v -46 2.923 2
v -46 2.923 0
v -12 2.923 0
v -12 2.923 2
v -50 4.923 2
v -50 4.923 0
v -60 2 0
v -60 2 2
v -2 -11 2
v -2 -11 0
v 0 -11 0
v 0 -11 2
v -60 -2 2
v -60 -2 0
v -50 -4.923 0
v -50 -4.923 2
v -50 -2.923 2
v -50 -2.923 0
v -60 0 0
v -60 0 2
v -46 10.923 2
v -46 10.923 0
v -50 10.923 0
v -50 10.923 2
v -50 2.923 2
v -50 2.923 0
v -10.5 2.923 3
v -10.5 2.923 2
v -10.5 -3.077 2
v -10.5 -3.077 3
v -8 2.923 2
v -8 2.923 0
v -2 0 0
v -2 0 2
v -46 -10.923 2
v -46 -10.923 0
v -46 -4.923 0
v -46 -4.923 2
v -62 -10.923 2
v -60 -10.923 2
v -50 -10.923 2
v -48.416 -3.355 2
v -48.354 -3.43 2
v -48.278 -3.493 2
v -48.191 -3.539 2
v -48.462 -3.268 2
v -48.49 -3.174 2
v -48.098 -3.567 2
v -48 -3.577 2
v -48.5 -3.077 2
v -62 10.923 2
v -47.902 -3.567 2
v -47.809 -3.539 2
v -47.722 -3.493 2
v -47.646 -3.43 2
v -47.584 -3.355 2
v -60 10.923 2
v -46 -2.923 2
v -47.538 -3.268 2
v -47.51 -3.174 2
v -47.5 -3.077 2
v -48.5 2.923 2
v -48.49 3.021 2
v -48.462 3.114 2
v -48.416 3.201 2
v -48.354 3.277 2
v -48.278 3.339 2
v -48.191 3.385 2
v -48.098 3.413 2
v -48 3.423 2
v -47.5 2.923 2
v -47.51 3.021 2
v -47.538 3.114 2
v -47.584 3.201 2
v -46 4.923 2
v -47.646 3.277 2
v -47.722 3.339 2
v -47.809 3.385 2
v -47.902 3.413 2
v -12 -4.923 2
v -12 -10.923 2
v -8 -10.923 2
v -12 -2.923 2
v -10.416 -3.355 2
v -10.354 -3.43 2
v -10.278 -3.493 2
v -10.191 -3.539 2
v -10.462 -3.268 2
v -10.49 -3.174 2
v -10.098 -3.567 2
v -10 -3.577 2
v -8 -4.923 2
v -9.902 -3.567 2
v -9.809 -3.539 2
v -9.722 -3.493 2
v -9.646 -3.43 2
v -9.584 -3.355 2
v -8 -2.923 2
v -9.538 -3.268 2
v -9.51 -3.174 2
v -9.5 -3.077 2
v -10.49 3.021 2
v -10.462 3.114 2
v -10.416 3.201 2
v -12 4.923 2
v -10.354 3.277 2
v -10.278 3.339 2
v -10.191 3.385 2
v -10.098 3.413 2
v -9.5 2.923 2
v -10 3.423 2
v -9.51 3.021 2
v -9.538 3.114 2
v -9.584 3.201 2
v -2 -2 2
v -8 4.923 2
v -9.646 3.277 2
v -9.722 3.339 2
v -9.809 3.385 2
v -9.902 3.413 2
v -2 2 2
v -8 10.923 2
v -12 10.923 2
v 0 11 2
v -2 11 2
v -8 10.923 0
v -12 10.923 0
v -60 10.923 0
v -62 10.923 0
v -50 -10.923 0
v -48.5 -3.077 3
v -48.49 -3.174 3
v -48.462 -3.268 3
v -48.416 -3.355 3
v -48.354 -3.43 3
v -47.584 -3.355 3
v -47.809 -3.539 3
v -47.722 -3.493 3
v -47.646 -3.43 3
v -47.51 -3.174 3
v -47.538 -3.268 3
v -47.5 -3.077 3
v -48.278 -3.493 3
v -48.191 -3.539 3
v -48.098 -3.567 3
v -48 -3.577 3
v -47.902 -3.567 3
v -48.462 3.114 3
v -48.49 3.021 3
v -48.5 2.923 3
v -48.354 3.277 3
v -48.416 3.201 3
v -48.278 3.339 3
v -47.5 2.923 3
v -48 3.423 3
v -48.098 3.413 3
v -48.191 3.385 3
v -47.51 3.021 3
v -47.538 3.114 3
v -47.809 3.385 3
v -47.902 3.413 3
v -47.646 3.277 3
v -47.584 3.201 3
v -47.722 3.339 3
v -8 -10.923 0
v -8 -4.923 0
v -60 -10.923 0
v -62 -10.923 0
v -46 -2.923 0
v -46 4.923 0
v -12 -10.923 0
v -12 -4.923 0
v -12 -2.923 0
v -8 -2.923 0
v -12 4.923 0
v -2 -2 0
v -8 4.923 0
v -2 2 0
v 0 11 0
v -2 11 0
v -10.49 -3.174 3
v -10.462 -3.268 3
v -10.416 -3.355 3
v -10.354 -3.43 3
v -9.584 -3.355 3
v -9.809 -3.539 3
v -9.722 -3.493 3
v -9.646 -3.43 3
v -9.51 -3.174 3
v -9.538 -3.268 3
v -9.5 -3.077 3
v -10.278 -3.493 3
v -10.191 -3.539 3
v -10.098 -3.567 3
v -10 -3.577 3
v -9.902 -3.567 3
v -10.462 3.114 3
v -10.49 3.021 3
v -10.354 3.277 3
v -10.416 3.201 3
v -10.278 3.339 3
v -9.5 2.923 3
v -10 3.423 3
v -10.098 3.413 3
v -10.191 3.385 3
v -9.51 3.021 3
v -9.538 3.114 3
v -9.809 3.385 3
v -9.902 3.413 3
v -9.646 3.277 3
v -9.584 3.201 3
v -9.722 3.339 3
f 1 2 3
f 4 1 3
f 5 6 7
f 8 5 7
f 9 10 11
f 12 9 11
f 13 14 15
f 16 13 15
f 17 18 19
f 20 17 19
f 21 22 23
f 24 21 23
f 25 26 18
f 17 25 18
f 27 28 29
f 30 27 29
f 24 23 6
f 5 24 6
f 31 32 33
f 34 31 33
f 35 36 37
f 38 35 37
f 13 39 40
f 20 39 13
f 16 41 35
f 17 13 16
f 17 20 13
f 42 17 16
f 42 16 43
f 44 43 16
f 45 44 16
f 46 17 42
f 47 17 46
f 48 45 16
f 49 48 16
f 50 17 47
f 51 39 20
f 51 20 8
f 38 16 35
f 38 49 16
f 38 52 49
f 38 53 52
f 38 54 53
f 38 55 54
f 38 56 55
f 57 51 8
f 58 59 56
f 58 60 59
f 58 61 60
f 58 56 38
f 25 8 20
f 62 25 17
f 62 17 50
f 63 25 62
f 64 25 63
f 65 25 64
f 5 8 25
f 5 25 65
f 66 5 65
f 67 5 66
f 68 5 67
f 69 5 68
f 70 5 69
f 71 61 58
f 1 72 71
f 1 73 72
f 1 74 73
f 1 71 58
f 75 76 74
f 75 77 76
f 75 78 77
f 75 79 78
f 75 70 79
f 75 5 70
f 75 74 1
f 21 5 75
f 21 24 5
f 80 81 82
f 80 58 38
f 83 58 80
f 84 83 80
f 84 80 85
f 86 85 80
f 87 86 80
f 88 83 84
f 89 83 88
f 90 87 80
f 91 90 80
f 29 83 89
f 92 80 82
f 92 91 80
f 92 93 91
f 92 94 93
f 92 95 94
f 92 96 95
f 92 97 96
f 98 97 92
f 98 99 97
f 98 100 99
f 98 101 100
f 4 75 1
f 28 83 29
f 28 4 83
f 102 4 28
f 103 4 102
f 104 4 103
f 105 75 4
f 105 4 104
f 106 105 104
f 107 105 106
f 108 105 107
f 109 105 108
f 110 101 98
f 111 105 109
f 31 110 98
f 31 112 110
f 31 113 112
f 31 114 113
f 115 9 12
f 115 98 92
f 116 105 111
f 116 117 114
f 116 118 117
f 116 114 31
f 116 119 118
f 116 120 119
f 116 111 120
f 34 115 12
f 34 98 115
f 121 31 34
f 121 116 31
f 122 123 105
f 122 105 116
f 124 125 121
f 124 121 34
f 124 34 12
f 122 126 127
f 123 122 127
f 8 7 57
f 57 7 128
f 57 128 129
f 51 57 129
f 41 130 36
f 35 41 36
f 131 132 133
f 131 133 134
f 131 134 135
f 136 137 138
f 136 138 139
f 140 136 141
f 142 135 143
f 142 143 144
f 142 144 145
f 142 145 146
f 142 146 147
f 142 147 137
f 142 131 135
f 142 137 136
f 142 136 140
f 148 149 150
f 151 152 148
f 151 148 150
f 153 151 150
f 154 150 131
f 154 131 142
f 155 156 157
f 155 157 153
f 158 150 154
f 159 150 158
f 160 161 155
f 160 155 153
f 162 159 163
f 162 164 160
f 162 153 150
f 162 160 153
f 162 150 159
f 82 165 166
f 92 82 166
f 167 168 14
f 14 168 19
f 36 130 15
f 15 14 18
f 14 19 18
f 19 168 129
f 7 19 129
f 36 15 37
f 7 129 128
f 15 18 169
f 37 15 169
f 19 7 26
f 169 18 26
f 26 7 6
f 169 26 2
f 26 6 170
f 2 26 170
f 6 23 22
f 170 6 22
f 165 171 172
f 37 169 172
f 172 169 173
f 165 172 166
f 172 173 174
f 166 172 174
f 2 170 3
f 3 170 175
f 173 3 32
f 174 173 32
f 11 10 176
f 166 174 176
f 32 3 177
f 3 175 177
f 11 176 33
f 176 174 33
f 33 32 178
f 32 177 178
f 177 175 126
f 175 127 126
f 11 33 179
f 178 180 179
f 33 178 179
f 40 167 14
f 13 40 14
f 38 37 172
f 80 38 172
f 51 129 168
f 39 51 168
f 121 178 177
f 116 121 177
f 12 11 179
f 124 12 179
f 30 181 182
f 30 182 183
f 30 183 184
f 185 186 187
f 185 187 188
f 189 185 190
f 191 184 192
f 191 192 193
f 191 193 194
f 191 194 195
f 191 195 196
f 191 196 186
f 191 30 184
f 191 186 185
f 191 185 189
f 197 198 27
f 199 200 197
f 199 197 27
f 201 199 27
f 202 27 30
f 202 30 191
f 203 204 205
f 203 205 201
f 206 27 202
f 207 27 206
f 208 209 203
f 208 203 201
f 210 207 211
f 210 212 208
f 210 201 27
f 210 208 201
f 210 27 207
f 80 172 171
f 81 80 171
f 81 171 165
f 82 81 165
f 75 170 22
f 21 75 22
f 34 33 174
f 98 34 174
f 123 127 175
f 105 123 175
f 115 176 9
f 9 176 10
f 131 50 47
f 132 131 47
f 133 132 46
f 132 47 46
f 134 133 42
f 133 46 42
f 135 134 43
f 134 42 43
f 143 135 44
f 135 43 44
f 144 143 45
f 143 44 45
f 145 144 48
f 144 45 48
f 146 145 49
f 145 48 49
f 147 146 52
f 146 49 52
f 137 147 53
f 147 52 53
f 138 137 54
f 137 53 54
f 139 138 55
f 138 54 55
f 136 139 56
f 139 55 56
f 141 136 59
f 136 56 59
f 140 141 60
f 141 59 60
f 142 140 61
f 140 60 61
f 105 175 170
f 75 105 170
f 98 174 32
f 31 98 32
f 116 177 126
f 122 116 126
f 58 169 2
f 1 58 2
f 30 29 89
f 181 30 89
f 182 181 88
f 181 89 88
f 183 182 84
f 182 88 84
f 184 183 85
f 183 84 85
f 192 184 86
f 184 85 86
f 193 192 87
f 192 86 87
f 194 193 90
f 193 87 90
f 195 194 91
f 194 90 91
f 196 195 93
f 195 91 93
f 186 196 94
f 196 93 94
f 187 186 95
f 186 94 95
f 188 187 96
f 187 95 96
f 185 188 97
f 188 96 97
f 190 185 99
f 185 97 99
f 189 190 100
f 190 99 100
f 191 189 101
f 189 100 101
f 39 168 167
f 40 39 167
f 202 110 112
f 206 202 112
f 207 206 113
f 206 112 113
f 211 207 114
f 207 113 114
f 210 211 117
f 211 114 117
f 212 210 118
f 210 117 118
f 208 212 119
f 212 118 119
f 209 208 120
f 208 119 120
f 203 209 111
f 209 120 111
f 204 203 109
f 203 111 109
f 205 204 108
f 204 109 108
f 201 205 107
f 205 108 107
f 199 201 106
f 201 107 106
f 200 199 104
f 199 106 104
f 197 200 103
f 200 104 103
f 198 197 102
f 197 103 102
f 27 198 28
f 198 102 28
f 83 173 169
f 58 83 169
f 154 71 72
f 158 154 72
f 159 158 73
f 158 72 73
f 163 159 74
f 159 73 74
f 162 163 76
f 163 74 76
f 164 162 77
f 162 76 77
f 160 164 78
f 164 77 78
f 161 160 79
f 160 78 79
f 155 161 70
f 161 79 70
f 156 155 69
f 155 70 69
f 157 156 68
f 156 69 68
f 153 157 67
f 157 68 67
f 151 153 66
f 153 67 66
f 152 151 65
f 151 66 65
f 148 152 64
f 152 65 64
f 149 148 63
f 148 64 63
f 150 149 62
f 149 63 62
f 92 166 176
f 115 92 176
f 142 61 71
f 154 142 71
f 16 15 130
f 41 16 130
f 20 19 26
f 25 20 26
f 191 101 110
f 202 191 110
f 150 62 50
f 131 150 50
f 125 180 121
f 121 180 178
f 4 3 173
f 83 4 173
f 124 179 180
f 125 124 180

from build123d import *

# Parameters (mm, degrees)
F1_DEPTH = 2
F3_DEPTH = 1


with BuildPart() as f1:
    # F0 (on Top) → F1 (new body)
    with BuildSketch(Plane.XY):
        Polygon((0, -11), (0, 0), (0, 11), (-2, 11), (-2, 2), (-8, 4.923089), (-8, 10.923089), (-12, 10.923089), (-12, 4.923089), (-29, 4.923089), (-46, 4.923089), (-46, 10.923089), (-50, 10.923089), (-50, 4.923089), (-60, 2), (-60, 10.923089), (-62, 10.923089), (-62, -10.923089), (-60, -10.923089), (-60, -2), (-50, -4.923089), (-50, -10.923089), (-46, -10.923089), (-46, -4.923089), (-29, -4.923089), (-12, -4.923089), (-12, -10.923089), (-8, -10.923089), (-8, -4.923089), (-2, -2), (-2, -11), align=None)
        Polygon((-60, 0), (-50, 2.923089), (-50, -2.923089), align=None, mode=Mode.SUBTRACT)
        Polygon((-12, 2.923089), (-12, 0), (-12, -2.923089), (-29, -2.923089), (-46, -2.923089), (-46, 0), (-46, 2.923089), (-29, 2.923089), align=None, mode=Mode.SUBTRACT)
        Polygon((-8, 2.923089), (-2, 0), (-8, -2.923089), (-8, 0), align=None, mode=Mode.SUBTRACT)
    extrude(amount=F1_DEPTH)

    # F2 (on face) → F3 (join)
    with BuildSketch(Plane.XY.offset(2)):
        with BuildLine():
            Line((-47.5, -3.076911), (-47.5, 2.923089))
            ThreePointArc((-47.5, 2.923089), (-48, 3.423089), (-48.5, 2.923089))
            Line((-48.5, 2.923089), (-48.5, -3.076911))
            ThreePointArc((-48.5, -3.076911), (-48, -3.576911), (-47.5, -3.076911))
        make_face()
        with BuildLine():
            Line((-9.5, -3.076911), (-9.5, 2.923089))
            ThreePointArc((-9.5, 2.923089), (-10, 3.423089), (-10.5, 2.923089))
            Line((-10.5, 2.923089), (-10.5, -3.076911))
            ThreePointArc((-10.5, -3.076911), (-10, -3.576911), (-9.5, -3.076911))
        make_face()
    extrude(amount=F3_DEPTH)


solid = f1.part
